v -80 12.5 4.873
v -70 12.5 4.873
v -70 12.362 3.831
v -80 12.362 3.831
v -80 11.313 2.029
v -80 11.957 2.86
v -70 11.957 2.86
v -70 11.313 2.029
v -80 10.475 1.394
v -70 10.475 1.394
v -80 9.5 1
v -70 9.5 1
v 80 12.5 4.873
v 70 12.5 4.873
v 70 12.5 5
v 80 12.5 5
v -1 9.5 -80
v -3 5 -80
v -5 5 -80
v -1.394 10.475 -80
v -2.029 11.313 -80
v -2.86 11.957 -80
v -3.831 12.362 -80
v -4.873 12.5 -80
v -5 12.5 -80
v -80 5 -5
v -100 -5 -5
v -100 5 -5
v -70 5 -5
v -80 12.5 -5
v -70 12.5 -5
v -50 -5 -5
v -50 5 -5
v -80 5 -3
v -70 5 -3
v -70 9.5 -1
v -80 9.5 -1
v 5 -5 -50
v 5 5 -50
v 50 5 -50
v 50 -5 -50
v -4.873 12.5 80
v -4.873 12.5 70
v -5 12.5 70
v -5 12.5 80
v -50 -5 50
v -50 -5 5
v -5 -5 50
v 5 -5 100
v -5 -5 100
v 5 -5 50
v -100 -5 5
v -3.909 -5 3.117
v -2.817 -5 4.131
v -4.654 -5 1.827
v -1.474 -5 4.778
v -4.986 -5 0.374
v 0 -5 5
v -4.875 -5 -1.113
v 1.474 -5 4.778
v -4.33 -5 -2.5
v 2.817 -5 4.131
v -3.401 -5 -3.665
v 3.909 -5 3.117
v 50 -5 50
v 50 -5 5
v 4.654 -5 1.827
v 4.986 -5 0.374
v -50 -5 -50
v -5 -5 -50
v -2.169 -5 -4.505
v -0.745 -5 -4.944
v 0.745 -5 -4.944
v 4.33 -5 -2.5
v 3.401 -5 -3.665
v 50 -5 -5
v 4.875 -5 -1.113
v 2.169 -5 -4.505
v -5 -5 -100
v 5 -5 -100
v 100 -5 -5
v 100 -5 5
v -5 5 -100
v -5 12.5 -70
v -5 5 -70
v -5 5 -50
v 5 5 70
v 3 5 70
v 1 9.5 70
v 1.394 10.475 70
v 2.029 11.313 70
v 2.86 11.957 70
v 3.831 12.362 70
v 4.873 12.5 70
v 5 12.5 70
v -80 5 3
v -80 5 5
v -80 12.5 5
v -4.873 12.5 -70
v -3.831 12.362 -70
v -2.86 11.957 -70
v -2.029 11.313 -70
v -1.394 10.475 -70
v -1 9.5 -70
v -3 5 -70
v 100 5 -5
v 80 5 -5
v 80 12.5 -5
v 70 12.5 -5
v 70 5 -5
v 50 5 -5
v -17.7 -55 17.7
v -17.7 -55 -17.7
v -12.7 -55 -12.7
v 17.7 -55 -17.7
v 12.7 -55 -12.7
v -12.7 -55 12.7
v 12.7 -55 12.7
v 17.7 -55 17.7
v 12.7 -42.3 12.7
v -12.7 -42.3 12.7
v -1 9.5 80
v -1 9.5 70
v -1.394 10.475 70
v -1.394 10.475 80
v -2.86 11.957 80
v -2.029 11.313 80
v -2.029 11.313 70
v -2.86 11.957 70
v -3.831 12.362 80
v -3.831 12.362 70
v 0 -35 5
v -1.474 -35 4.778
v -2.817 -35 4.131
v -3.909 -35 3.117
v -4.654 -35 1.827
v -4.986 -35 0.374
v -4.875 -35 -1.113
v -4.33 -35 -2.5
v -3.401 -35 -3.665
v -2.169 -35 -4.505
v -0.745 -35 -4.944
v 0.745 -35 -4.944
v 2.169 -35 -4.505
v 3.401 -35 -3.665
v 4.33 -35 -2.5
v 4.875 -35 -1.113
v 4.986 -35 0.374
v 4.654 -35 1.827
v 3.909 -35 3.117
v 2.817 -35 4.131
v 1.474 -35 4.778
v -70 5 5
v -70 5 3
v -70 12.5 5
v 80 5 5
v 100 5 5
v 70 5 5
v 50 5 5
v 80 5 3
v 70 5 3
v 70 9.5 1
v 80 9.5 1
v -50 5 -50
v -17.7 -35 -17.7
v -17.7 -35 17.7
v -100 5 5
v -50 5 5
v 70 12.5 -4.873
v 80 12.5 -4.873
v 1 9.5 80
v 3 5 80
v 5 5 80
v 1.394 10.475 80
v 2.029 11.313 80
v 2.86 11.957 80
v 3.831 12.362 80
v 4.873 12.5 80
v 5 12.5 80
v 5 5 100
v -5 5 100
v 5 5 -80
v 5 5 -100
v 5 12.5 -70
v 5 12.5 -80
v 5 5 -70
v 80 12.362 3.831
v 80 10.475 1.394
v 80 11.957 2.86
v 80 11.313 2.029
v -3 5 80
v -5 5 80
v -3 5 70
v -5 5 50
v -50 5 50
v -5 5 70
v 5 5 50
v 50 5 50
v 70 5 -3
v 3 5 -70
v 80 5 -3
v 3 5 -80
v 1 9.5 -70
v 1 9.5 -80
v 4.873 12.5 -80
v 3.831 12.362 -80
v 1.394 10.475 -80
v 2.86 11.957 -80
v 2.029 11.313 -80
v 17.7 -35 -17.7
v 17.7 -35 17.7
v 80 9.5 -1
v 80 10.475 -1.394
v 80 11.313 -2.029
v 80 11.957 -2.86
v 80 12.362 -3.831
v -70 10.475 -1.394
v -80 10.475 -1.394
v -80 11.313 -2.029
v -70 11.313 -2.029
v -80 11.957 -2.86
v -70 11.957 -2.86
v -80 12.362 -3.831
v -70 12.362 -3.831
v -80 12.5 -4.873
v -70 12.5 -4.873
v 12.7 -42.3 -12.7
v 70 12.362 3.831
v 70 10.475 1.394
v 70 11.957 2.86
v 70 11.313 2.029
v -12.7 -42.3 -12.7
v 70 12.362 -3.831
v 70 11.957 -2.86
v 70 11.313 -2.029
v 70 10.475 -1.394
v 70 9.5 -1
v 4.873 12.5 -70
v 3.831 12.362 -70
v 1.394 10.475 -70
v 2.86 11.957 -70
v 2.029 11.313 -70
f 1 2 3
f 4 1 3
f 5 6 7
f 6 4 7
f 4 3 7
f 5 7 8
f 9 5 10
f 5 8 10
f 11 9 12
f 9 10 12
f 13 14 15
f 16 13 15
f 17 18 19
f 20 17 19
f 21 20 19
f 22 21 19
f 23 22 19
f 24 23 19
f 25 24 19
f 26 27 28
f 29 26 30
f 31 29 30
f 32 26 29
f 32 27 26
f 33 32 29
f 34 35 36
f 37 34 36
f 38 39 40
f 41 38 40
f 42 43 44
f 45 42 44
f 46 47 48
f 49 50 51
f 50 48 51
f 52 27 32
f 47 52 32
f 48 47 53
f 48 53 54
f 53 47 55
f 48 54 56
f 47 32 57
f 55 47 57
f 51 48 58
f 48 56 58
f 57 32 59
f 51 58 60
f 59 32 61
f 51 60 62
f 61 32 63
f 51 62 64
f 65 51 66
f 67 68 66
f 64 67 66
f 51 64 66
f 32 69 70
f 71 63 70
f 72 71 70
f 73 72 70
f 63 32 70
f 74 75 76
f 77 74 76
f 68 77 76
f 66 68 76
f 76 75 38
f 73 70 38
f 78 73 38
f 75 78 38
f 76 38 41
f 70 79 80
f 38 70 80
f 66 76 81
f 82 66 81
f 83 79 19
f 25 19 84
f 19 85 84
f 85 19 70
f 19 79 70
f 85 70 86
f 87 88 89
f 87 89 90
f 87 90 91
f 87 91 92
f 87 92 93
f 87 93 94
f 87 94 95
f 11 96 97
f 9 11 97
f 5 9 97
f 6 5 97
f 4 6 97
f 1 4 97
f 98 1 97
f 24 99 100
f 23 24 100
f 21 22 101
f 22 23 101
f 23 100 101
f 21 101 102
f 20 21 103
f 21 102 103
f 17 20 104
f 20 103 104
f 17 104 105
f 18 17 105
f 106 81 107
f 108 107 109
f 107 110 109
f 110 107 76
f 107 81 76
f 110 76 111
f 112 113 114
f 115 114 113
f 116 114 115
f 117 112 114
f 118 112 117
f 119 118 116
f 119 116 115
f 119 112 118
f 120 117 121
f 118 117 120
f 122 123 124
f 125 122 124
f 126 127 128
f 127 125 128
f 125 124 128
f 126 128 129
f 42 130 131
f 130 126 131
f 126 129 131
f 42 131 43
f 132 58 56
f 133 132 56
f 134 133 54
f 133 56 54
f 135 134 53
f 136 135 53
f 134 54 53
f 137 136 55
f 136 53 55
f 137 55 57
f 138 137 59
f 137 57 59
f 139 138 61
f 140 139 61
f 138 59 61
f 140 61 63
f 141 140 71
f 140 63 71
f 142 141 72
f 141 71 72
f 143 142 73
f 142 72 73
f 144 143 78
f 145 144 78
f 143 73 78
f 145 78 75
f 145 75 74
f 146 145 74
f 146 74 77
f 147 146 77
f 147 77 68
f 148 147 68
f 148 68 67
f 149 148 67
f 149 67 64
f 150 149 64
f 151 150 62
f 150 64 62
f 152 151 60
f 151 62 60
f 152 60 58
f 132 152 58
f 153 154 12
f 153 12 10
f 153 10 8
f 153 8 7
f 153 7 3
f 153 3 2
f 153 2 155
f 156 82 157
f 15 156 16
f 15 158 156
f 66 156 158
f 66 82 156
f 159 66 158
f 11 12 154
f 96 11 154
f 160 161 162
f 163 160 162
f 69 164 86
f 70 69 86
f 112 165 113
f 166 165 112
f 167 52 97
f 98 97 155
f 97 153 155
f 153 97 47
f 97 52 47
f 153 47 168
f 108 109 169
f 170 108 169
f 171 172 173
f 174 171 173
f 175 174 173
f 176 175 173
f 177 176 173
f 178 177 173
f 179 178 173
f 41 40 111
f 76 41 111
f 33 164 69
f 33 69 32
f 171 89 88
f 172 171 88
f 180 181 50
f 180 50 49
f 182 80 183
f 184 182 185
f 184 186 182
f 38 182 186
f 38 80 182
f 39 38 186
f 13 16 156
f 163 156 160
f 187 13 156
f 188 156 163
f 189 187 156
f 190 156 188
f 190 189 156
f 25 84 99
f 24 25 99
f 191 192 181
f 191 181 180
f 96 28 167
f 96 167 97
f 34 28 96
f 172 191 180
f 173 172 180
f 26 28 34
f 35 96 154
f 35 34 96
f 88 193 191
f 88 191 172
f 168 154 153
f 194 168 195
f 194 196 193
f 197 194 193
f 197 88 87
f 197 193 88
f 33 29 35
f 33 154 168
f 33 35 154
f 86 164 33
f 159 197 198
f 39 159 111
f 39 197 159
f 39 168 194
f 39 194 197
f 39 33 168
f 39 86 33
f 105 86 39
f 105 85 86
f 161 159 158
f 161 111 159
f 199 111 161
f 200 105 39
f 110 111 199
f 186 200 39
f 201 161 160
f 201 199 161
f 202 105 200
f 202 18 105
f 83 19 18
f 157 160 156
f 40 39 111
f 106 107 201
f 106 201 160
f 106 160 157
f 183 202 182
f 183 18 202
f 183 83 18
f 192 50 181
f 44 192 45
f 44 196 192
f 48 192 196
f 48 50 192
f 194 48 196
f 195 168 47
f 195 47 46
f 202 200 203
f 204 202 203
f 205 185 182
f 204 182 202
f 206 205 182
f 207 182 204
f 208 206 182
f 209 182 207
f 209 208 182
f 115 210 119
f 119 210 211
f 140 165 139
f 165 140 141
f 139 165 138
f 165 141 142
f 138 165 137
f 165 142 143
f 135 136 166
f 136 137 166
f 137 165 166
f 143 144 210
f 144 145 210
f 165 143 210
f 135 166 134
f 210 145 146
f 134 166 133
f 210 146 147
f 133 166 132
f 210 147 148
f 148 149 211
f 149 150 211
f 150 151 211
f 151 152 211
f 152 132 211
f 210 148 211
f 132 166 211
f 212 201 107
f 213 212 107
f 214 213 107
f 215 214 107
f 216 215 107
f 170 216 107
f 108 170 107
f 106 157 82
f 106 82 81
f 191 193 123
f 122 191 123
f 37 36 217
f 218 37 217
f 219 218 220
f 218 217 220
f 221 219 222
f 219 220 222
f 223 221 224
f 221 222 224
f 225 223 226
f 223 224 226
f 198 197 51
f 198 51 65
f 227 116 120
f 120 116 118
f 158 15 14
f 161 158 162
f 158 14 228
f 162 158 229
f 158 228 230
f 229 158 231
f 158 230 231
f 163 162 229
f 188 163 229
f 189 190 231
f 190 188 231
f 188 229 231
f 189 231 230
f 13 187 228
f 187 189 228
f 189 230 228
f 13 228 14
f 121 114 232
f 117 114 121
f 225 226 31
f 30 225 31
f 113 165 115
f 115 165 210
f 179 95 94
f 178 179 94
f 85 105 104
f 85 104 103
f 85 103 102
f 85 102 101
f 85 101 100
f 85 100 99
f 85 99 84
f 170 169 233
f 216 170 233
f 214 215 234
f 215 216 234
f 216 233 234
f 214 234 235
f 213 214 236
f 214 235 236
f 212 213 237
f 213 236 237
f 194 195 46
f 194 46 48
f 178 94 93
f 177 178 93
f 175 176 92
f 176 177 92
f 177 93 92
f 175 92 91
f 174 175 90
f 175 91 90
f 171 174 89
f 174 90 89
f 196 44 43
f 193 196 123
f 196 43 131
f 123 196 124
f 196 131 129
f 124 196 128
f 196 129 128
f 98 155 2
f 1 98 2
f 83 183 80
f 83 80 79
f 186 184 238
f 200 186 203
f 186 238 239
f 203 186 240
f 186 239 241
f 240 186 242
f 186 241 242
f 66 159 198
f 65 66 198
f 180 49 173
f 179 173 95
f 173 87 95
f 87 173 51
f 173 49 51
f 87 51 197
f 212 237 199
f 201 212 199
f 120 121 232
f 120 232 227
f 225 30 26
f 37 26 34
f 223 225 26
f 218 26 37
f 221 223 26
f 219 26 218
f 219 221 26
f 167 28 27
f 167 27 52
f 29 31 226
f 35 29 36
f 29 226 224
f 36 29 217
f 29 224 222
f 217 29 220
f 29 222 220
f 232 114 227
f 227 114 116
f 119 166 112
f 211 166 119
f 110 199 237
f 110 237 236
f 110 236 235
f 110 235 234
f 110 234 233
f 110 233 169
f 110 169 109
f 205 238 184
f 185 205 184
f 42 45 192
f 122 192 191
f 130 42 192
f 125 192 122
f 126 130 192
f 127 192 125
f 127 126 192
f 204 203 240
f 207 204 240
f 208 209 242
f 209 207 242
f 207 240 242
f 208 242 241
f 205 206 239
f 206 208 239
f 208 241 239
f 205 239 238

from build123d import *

# Parameters (mm, degrees)
SKETCH2_W            = 100
SKETCH2_H            = 100
BOSS_EXTRUDE1_DEPTH  = 5
SKETCH3_W            = 100
SKETCH3_H            = 100
BOSS_EXTRUDE2_DEPTH  = 5
SKETCH8_R            = 5
BOSS_EXTRUDE7_DEPTH  = 30
SKETCH9_W            = 35.4
SKETCH9_H            = 35.4
BOSS_EXTRUDE8_DEPTH  = 20
SKETCH10_W           = 25.4
SKETCH10_H           = 25.4
CUT_EXTRUDE1_DEPTH   = 12.7
SKETCH11_W           = 10
SKETCH11_H           = 10
BOSS_EXTRUDE9_DEPTH  = 20
BOSS_EXTRUDE13_DEPTH = 10
FILLET3_R            = 4
FILLET5_R            = 4
SKETCH16_W           = 10
SKETCH16_H           = 10
BOSS_EXTRUDE14_DEPTH = 20
SKETCH13_W           = 10
SKETCH13_H           = 10
BOSS_EXTRUDE11_DEPTH = 20
BOSS_EXTRUDE17_DEPTH = 10
FILLET9_R            = 4
FILLET10_R           = 4
SKETCH21_W           = 10
SKETCH21_H           = 10
BOSS_EXTRUDE18_DEPTH = 20
SKETCH14_W           = 10
SKETCH14_H           = 10
BOSS_EXTRUDE12_DEPTH = 20
BOSS_EXTRUDE15_DEPTH = 10
FILLET7_R            = 4
SKETCH18_W           = 10
SKETCH18_H           = 10
BOSS_EXTRUDE16_DEPTH = 20
FILLET8_R            = 4
SKETCH12_W           = 10
SKETCH12_H           = 10
BOSS_EXTRUDE10_DEPTH = 20
BOSS_EXTRUDE19_DEPTH = 10
FILLET11_R           = 4
FILLET12_R           = 4
SKETCH23_W           = 10
SKETCH23_H           = 10
BOSS_EXTRUDE20_DEPTH = 20


with BuildPart() as part:
    # Sketch2 → Boss-Extrude1 (new body)
    with BuildSketch(Plane(origin=(0, 0, 0), x_dir=(1, 0, 0), z_dir=(0, 1, 0))):
        Rectangle(SKETCH2_W, SKETCH2_H)
    extrude(amount=BOSS_EXTRUDE1_DEPTH)

    # Sketch3 → Boss-Extrude2 (add)
    with BuildSketch(Plane.XZ):
        Rectangle(SKETCH3_W, SKETCH3_H)
    extrude(amount=BOSS_EXTRUDE2_DEPTH)

    # Sketch8 → Boss-Extrude7 (add)
    with BuildSketch(Plane.XZ.offset(5)):
        with Locations(Location((0, 0, 0), (0, 0, 90))):
            Circle(SKETCH8_R)
    extrude(amount=BOSS_EXTRUDE7_DEPTH)

    # Sketch9 → Boss-Extrude8 (add)
    with BuildSketch(Plane.XZ.offset(35)):
        Rectangle(SKETCH9_W, SKETCH9_H)
    extrude(amount=BOSS_EXTRUDE8_DEPTH)

    # Sketch10 → Cut-Extrude1 (cut)
    with BuildSketch(Plane.XZ.offset(55)):
        Rectangle(SKETCH10_W, SKETCH10_H)
    extrude(amount=-CUT_EXTRUDE1_DEPTH, mode=Mode.SUBTRACT)

    # Sketch11 → Boss-Extrude9 (add)
    with BuildSketch(Plane(origin=(50, 0, 0), x_dir=(0, 0, -1), z_dir=(1, 0, 0))):
        Rectangle(SKETCH11_W, SKETCH11_H)
    extrude(amount=BOSS_EXTRUDE9_DEPTH)

    # Sketch15 → Boss-Extrude13 (add)
    with BuildSketch(Plane(origin=(70, 0, 0), x_dir=(0, 0, -1), z_dir=(1, 0, 0))):
        Polygon((-5, -5), (5, -5), (5, 12.5), (1, 12.5), (1, 9.5), (3, 5), (-3, 5), (-1, 9.5), (-1, 12.5), (-5, 12.5), align=None)
    extrude(amount=BOSS_EXTRUDE13_DEPTH)

    # Fillet3
    # the kernel refuses this fillet: 4 mm, written as the material it takes off along each edge
    with BuildSketch(Plane(origin=(60.317541634, 12.5, 1), x_dir=(0, -1, 0), z_dir=(1, 0, 0))) as fillet3_piece_1:
        with BuildLine():
            CenterArc((4, -3.872983346), FILLET3_R, 104.477512186, 75.522487814)
            Line((0, -3.872983346), (-0.08, -3.872983346))
            Line((-0.08, -3.872983346), (-0.08, 0))
            Line((-0.08, 0), (0, 0.08))
            ThreePointArc((0, 0.08), (1.5, 0.08), (2.98, 0.077459667))
            Line((2.98, 0.077459667), (3, 0))
        make_face()
    extrude(amount=29.364916731, mode=Mode.SUBTRACT)

    # Fillet5
    # the kernel refuses this fillet: 4 mm, written as the material it takes off along each edge
    with BuildSketch(Plane(origin=(60.317541634, 12.5, -1), x_dir=(0, 0, -1), z_dir=(1, 0, 0))) as fillet5_piece_1:
        with BuildLine():
            CenterArc((3.872983346, -4), FILLET5_R, 90, 75.522487814)
            Line((0, -3), (-0.077459667, -2.98))
            ThreePointArc((-0.077459667, -2.98), (-0.08, -1.5), (-0.08, 0))
            Line((-0.08, 0), (0, 0.08))
            Line((0, 0.08), (3.872983346, 0.08))
            Line((3.872983346, 0.08), (3.872983346, 0))
        make_face()
    extrude(amount=29.364916731, mode=Mode.SUBTRACT)

    # Sketch16 → Boss-Extrude14 (add)
    with BuildSketch(Plane(origin=(80, 0, 0), x_dir=(0, 0, -1), z_dir=(1, 0, 0))):
        Rectangle(SKETCH16_W, SKETCH16_H)
    extrude(amount=BOSS_EXTRUDE14_DEPTH)

    # Sketch13 → Boss-Extrude11 (add)
    with BuildSketch(Plane.ZY.offset(50)):
        Rectangle(SKETCH13_W, SKETCH13_H)
    extrude(amount=BOSS_EXTRUDE11_DEPTH)

    # Sketch19 → Boss-Extrude17 (add)
    with BuildSketch(Plane.ZY.offset(70)):
        Polygon((-5, -5), (5, -5), (5, 12.5), (1, 12.5), (1, 9.5), (3, 5), (-3, 5), (-1, 9.5), (-1, 12.499789013), (-5, 12.499789013), align=None)
    extrude(amount=BOSS_EXTRUDE17_DEPTH)

    # Fillet9
    # the kernel refuses this fillet: 4 mm, written as the material it takes off along each edge
    with BuildSketch(Plane(origin=(-60.317677841, 12.499789013, -1), x_dir=(0, -1, 0), z_dir=(-1, 0, 0))) as fillet9_piece_1:
        with BuildLine():
            CenterArc((4, -3.872928863), FILLET9_R, 104.480633491, 75.519366509)
            Line((0, -3.872928863), (-0.08, -3.872928863))
            Line((-0.08, -3.872928863), (-0.08, 0))
            Line((-0.08, 0), (0, 0.08))
            ThreePointArc((0, 0.08), (1.499894506, 0.08), (2.979784793, 0.077458577))
            Line((2.979784793, 0.077458577), (2.999789013, 0))
        make_face()
    extrude(amount=29.364644317, mode=Mode.SUBTRACT)

    # Fillet10
    # the kernel refuses this fillet: 4 mm, written as the material it takes off along each edge
    with BuildSketch(Plane(origin=(-60.317541634, 12.5, 1), x_dir=(0, 0, 1), z_dir=(-1, 0, 0))) as fillet10_piece_1:
        with BuildLine():
            CenterArc((3.872983346, -4), FILLET10_R, 90, 75.522487814)
            Line((0, -3), (-0.077459667, -2.98))
            ThreePointArc((-0.077459667, -2.98), (-0.08, -1.5), (-0.08, 0))
            Line((-0.08, 0), (0, 0.08))
            Line((0, 0.08), (3.872983346, 0.08))
            Line((3.872983346, 0.08), (3.872983346, 0))
        make_face()
    extrude(amount=29.364916731, mode=Mode.SUBTRACT)

    # Sketch21 → Boss-Extrude18 (add)
    with BuildSketch(Plane.ZY.offset(80)):
        Rectangle(SKETCH21_W, SKETCH21_H)
    extrude(amount=BOSS_EXTRUDE18_DEPTH)

    # Sketch14 → Boss-Extrude12 (add)
    with BuildSketch(Plane(origin=(0, 0, -50), x_dir=(-1, 0, 0), z_dir=(0, 0, -1))):
        Rectangle(SKETCH14_W, SKETCH14_H)
    extrude(amount=BOSS_EXTRUDE12_DEPTH)

    # Sketch17 → Boss-Extrude15 (add)
    with BuildSketch(Plane(origin=(0, 0, -70), x_dir=(-1, 0, 0), z_dir=(0, 0, -1))):
        Polygon((-5, -5), (5, -5), (5, 12.5), (1, 12.5), (1, 9.5), (3, 5), (-3, 5), (-1, 9.5), (-1, 12.5), (-5, 12.5), align=None)
    extrude(amount=BOSS_EXTRUDE15_DEPTH)

    # Fillet7
    # the kernel refuses this fillet: 4 mm, written as the material it takes off along each edge
    with BuildSketch(Plane(origin=(1, 12.5, -60.317541634), x_dir=(0, -1, 0), z_dir=(0, 0, -1))) as fillet7_piece_1:
        with BuildLine():
            CenterArc((4, -3.872983346), FILLET7_R, 104.477512186, 75.522487814)
            Line((0, -3.872983346), (-0.08, -3.872983346))
            Line((-0.08, -3.872983346), (-0.08, 0))
            Line((-0.08, 0), (0, 0.08))
            ThreePointArc((0, 0.08), (1.5, 0.08), (2.98, 0.077459667))
            Line((2.98, 0.077459667), (3, 0))
        make_face()
    extrude(amount=29.364916731, mode=Mode.SUBTRACT)

    # Sketch18 → Boss-Extrude16 (add)
    with BuildSketch(Plane(origin=(0, 0, -80), x_dir=(-1, 0, 0), z_dir=(0, 0, -1))):
        Rectangle(SKETCH18_W, SKETCH18_H)
    extrude(amount=BOSS_EXTRUDE16_DEPTH)

    # Fillet8
    # the kernel refuses this fillet: 4 mm, written as the material it takes off along each edge
    with BuildSketch(Plane(origin=(-1, 12.5, -60.317541634), x_dir=(-1, 0, 0), z_dir=(0, 0, -1))) as fillet8_piece_1:
        with BuildLine():
            CenterArc((3.872983346, -4), FILLET8_R, 90, 75.522487814)
            Line((0, -3), (-0.077459667, -2.98))
            ThreePointArc((-0.077459667, -2.98), (-0.08, -1.5), (-0.08, 0))
            Line((-0.08, 0), (0, 0.08))
            Line((0, 0.08), (3.872983346, 0.08))
            Line((3.872983346, 0.08), (3.872983346, 0))
        make_face()
    extrude(amount=29.364916731, mode=Mode.SUBTRACT)

    # Sketch12 → Boss-Extrude10 (add)
    with BuildSketch(Plane.XY.offset(50)):
        Rectangle(SKETCH12_W, SKETCH12_H)
    extrude(amount=BOSS_EXTRUDE10_DEPTH)

    # Sketch22 → Boss-Extrude19 (add)
    with BuildSketch(Plane.XY.offset(70)):
        Polygon((5, -5), (5, 12.5), (1, 12.5), (1, 9.5), (3, 5), (-3, 5), (-1, 9.5), (-1, 12.5), (-5, 12.5), (-5, -5), align=None)
    extrude(amount=BOSS_EXTRUDE19_DEPTH)

    # Fillet11
    # the kernel refuses this fillet: 4 mm, written as the material it takes off along each edge
    with BuildSketch(Plane(origin=(-1, 12.5, 60.317541634), x_dir=(0, -1, 0), z_dir=(0, 0, 1))) as fillet11_piece_1:
        with BuildLine():
            CenterArc((4, -3.872983346), FILLET11_R, 104.477512186, 75.522487814)
            Line((0, -3.872983346), (-0.08, -3.872983346))
            Line((-0.08, -3.872983346), (-0.08, 0))
            Line((-0.08, 0), (0, 0.08))
            ThreePointArc((0, 0.08), (1.5, 0.08), (2.98, 0.077459667))
            Line((2.98, 0.077459667), (3, 0))
        make_face()
    extrude(amount=29.364916731, mode=Mode.SUBTRACT)

    # Fillet12
    # the kernel refuses this fillet: 4 mm, written as the material it takes off along each edge
    with BuildSketch(Plane(origin=(1, 12.5, 60.317541634), x_dir=(1, 0, 0), z_dir=(0, 0, 1))) as fillet12_piece_1:
        with BuildLine():
            CenterArc((3.872983346, -4), FILLET12_R, 90, 75.522487814)
            Line((0, -3), (-0.077459667, -2.98))
            ThreePointArc((-0.077459667, -2.98), (-0.08, -1.5), (-0.08, 0))
            Line((-0.08, 0), (0, 0.08))
            Line((0, 0.08), (3.872983346, 0.08))
            Line((3.872983346, 0.08), (3.872983346, 0))
        make_face()
    extrude(amount=29.364916731, mode=Mode.SUBTRACT)

    # Sketch23 → Boss-Extrude20 (add)
    with BuildSketch(Plane.XY.offset(80)):
        Rectangle(SKETCH23_W, SKETCH23_H)
    extrude(amount=BOSS_EXTRUDE20_DEPTH)


solid = part.part
